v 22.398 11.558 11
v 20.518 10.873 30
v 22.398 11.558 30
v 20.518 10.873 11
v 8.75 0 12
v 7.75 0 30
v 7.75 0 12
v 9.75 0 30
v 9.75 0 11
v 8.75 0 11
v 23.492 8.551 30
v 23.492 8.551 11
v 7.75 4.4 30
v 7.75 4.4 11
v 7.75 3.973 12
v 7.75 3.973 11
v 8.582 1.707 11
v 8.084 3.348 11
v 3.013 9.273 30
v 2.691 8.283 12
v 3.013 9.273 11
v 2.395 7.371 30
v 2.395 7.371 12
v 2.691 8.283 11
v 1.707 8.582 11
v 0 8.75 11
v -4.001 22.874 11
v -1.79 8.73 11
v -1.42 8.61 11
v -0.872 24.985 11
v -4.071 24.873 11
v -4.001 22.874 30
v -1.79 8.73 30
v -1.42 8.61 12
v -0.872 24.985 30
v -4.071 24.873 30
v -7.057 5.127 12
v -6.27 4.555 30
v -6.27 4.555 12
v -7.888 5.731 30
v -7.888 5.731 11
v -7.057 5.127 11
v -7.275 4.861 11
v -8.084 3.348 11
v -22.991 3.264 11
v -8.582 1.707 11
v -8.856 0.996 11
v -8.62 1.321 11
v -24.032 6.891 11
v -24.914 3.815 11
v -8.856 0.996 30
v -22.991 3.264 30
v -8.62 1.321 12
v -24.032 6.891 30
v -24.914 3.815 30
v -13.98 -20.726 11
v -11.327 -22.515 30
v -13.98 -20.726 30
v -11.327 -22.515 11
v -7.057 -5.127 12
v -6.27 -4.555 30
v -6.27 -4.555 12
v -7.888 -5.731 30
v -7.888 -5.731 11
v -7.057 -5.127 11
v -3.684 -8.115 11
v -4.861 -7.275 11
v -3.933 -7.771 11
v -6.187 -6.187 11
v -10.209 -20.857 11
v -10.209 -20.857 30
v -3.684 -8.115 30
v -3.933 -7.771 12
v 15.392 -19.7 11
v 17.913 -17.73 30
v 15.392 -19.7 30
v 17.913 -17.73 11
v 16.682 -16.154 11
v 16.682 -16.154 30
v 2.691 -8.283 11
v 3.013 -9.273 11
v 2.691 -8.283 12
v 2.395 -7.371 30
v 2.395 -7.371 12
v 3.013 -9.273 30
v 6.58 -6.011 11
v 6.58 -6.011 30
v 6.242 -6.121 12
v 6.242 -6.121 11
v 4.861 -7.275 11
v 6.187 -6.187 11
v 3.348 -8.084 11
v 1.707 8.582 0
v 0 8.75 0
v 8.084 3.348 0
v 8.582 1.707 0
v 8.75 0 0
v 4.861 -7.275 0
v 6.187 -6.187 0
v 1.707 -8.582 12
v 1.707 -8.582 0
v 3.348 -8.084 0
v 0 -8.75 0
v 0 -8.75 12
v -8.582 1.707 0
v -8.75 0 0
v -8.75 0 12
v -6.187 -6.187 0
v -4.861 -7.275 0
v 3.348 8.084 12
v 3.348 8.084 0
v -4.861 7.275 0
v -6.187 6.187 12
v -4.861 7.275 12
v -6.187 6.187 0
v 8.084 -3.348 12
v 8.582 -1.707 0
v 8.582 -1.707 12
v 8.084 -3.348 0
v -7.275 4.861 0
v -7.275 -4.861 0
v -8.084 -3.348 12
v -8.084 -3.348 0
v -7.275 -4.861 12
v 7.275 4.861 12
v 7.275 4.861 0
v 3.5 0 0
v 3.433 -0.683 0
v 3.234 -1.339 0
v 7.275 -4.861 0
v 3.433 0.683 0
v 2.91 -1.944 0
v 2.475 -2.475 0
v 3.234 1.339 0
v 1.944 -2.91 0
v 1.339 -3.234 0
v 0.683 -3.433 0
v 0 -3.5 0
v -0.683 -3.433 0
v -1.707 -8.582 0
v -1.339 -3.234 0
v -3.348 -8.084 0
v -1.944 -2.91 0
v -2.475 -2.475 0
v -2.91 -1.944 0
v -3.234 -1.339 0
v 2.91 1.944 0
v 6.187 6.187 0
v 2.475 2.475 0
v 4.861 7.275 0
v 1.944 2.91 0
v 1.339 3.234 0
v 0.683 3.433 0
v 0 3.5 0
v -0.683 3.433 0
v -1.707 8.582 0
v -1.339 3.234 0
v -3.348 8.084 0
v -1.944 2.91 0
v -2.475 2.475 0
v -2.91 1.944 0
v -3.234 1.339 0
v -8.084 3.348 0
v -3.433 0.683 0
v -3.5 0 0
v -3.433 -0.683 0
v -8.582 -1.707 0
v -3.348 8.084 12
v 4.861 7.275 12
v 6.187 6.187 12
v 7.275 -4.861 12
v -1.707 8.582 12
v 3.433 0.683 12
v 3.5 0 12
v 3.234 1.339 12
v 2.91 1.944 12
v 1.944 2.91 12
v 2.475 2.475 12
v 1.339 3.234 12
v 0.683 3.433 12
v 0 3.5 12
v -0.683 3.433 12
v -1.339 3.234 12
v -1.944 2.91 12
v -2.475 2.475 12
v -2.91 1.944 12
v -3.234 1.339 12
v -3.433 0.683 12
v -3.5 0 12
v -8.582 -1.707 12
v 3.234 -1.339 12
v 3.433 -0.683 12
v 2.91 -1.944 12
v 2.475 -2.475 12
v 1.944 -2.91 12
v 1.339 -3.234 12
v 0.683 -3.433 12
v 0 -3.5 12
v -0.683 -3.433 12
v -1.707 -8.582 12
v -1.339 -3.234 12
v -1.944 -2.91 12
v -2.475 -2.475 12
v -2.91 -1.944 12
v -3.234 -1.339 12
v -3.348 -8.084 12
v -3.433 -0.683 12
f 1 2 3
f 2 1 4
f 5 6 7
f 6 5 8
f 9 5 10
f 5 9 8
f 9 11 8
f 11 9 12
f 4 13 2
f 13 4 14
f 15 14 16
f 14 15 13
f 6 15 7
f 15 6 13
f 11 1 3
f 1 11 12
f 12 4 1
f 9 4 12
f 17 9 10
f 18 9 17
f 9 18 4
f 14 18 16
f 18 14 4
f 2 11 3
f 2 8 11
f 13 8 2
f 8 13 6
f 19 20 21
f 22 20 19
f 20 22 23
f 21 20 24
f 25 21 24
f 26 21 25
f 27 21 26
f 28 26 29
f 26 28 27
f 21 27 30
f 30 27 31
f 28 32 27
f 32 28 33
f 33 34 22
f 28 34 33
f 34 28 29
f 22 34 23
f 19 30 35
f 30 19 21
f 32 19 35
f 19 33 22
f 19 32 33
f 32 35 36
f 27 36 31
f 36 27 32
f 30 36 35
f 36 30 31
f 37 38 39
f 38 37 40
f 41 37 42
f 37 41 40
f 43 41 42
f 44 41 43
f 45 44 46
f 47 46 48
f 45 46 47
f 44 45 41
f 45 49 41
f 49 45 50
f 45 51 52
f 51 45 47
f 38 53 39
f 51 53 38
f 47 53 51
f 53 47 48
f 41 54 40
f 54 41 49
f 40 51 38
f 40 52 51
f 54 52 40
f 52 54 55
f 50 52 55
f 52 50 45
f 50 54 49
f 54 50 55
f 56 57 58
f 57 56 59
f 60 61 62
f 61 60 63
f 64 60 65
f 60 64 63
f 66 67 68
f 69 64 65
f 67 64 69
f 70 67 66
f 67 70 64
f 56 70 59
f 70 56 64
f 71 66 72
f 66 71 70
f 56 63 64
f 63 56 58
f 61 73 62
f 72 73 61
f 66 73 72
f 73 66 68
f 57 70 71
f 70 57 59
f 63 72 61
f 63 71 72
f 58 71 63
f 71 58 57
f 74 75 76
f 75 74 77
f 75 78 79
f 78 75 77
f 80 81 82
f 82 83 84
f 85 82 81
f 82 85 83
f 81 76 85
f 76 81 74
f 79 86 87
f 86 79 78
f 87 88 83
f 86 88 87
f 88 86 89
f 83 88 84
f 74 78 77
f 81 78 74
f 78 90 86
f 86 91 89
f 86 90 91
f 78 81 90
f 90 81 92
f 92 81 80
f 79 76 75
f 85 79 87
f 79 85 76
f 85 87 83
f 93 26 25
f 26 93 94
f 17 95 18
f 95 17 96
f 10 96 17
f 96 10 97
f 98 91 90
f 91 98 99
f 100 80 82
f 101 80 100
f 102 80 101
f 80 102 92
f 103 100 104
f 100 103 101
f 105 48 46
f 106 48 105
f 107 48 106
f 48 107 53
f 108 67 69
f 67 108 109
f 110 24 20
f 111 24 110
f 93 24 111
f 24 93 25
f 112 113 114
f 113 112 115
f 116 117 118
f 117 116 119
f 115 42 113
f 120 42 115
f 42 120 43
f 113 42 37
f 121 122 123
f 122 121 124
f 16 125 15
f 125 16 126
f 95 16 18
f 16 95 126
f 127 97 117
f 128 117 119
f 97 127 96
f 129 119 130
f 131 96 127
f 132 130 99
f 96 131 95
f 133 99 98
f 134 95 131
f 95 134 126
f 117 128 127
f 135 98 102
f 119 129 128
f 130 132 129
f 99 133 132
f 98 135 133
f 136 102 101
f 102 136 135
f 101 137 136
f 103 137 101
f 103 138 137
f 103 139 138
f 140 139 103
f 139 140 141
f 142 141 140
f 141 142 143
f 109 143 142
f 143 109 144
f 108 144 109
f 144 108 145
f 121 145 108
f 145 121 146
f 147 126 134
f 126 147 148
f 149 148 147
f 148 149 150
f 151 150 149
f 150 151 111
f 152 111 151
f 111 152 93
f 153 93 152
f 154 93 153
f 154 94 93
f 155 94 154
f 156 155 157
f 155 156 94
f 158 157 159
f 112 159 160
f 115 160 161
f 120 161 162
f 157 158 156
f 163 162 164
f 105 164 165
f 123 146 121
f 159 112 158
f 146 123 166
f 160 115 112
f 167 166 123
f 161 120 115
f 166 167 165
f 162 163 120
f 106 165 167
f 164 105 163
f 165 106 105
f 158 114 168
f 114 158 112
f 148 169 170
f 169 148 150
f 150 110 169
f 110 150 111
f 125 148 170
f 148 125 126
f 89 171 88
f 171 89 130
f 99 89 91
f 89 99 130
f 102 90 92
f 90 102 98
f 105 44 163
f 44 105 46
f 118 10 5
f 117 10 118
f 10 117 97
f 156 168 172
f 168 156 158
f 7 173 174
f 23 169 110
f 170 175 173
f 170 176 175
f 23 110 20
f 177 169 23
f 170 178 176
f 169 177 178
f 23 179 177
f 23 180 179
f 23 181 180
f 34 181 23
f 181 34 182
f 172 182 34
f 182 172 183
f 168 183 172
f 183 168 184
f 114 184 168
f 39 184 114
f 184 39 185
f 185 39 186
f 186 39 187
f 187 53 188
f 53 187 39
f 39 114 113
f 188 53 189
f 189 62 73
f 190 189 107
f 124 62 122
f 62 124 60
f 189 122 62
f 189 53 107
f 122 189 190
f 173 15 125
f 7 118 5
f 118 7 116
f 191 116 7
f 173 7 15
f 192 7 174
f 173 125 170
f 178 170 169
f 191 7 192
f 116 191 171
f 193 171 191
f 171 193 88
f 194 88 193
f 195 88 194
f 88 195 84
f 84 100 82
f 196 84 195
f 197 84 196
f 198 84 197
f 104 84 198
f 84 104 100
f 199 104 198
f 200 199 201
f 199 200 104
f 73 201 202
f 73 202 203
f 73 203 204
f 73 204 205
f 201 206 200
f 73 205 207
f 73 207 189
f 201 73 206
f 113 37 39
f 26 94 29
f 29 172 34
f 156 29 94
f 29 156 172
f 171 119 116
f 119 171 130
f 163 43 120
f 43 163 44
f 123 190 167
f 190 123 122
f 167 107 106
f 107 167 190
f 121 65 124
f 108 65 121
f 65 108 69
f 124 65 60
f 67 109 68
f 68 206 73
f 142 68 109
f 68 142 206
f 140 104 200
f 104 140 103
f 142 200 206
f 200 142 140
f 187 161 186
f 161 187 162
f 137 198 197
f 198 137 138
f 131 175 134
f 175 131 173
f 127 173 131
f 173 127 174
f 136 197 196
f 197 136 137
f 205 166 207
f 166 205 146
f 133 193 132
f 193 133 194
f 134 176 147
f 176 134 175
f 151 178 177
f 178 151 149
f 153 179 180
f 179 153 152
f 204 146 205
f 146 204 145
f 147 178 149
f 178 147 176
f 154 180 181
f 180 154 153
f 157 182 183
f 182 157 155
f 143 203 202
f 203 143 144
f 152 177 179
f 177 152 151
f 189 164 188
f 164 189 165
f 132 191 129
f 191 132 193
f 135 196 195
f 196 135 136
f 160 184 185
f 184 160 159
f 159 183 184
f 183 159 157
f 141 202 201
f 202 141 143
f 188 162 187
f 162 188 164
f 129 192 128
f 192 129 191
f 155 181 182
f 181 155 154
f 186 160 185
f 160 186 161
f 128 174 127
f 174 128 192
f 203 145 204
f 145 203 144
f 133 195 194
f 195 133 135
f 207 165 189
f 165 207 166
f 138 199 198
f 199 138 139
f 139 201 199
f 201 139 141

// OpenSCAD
$fn = 32;

// ----------------------------------------------------------------------
// Impeller: 50 mm, 5 blades, 30 mm tall
// ----------------------------------------------------------------------

// --- parameters (mm) ---
boss_d = 17.5;            // hub diameter
boss_h = 12;              // hub height
rotor_d = 50;             // outer diameter over the blades
vane_count = 5;           // number of blades
blade_t = 2;              // blade thickness
blade_h = 18;             // blade height
blade_in_r = 7.75;        // blade root radius
blade_out_r = 23;         // blade tip radius
sweep = 20;               // blade sweep, degrees
bore_d = 7;               // shaft bore

module hub() {
  cylinder(h = boss_h, d = boss_d);
}

module blade() {
  /* blade swept between two boxes: hull of the root and the tip section */
  hull() {
    translate([blade_in_r, 0, boss_h - 1])
      cube([blade_t, blade_t * 2.2, blade_h + 1], center = false);
    rotate([0, 0, sweep])
      translate([blade_out_r, 0, boss_h - 1])
        cube([blade_t, blade_t * 1.6, blade_h + 1], center = false);
  }
}

module blades() {
  for (i = [0 : vane_count - 1])
    rotate([0, 0, i * 360 / vane_count]) blade();
}

difference() {
  union() {
    hub();
    blades();
  }
  translate([0, 0, -1]) cylinder(h = boss_h + blade_h + 0 + 3, d = bore_d);
}
